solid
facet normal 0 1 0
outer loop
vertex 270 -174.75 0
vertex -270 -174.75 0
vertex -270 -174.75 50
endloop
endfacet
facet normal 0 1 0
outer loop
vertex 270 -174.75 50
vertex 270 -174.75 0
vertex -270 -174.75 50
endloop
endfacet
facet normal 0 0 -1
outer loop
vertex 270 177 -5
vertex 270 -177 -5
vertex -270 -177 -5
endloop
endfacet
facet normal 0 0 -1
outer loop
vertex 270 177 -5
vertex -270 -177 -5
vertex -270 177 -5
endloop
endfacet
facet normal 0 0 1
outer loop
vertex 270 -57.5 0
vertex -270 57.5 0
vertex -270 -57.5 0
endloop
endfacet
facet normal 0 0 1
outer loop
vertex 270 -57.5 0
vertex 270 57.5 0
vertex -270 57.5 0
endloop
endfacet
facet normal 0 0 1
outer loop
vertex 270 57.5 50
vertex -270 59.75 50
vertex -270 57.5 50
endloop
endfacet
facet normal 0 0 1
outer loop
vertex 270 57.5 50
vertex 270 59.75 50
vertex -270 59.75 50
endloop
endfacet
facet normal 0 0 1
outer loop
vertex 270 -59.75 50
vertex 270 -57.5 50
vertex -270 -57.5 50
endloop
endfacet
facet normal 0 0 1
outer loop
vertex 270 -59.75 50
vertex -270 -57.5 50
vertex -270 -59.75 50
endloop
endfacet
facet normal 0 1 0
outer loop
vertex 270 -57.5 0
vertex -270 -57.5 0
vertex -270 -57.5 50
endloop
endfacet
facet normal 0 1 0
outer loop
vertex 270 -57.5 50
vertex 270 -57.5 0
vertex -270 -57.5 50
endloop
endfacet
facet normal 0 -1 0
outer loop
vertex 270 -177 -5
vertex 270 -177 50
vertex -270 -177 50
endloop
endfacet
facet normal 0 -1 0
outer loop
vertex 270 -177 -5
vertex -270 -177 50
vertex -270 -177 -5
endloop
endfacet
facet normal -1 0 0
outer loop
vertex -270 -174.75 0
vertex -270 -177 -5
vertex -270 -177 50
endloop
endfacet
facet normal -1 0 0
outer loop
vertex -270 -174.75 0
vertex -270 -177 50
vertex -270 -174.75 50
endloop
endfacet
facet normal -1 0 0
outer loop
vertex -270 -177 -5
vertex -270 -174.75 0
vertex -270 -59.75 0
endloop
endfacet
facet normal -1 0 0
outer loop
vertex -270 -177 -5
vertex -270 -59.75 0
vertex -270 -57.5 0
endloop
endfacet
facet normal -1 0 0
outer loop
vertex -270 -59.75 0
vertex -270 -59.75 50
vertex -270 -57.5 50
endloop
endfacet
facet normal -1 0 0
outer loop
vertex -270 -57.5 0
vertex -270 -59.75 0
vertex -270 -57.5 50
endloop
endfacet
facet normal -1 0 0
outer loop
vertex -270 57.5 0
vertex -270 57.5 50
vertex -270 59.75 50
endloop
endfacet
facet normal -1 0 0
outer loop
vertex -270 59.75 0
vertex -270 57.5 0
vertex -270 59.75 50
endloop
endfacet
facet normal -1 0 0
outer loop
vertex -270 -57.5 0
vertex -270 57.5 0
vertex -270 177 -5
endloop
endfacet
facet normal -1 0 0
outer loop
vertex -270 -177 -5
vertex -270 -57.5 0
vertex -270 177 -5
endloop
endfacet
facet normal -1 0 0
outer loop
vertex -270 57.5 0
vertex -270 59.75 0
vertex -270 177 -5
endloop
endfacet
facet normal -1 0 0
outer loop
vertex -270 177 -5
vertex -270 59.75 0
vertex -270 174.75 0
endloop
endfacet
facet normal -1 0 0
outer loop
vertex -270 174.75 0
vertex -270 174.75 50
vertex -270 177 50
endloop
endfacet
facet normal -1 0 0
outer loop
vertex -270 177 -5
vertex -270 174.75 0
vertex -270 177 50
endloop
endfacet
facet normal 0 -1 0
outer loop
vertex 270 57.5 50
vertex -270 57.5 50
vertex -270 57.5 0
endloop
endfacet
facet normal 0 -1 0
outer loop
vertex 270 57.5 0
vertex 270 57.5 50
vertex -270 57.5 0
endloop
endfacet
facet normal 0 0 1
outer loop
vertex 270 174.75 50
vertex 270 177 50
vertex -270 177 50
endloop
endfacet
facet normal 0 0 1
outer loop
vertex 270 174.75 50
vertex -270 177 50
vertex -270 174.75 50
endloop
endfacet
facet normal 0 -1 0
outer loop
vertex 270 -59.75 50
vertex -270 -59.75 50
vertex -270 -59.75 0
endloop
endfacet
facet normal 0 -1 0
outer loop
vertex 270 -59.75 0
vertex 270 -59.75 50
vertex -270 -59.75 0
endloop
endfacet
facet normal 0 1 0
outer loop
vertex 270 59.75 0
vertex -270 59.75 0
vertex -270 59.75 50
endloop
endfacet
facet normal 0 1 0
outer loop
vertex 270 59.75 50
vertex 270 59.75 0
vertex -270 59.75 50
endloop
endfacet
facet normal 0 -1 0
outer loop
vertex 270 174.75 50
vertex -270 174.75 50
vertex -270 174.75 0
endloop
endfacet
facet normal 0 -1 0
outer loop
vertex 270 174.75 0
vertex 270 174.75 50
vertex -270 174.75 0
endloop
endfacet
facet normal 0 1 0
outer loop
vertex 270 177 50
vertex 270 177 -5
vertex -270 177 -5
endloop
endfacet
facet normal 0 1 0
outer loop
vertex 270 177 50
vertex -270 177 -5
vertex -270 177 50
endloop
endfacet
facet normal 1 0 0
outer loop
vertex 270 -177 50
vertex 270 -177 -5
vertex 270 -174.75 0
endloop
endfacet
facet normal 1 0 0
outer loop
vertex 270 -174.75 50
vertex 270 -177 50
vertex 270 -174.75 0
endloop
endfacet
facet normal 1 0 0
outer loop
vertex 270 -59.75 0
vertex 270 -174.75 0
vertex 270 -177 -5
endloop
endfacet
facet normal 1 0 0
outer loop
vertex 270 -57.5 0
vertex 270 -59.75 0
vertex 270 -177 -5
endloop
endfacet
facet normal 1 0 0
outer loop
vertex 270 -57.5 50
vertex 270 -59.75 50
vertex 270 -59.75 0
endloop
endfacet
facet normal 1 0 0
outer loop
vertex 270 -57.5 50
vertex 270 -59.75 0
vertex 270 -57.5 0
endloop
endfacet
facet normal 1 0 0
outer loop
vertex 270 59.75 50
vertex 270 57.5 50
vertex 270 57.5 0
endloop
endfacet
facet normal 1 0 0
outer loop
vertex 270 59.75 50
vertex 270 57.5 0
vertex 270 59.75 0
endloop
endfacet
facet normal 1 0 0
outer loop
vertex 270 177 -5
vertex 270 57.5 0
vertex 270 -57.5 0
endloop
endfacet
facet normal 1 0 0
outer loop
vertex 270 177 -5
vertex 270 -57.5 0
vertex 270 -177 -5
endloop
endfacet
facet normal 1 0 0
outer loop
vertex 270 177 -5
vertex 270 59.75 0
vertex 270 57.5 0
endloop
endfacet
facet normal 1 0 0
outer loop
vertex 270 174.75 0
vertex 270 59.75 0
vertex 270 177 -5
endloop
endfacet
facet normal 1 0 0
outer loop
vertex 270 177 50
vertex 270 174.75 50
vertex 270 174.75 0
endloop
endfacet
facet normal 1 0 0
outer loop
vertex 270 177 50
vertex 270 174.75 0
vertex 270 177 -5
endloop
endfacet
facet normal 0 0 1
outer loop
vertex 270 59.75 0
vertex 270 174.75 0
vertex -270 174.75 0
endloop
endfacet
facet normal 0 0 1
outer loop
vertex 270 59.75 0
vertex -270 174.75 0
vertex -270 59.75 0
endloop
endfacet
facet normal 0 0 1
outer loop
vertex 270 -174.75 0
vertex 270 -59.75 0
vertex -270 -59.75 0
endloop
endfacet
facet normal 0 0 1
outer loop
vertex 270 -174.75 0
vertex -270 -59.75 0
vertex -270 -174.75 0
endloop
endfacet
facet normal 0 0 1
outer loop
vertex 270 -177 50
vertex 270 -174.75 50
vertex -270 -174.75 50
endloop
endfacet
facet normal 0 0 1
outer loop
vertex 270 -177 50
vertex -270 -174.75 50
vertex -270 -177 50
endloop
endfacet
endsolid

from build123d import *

# Parameters (mm, degrees)
F1_DEPTH = 270


with BuildPart() as f1:
    # F0 (on Right) → F1 (new body, symmetric)
    with BuildSketch(Plane.YZ):
        Polygon((57.5, 0), (0, 0), (-57.5, 0), (-57.5, 50), (-59.75, 50), (-59.75, 0), (-174.75, 0), (-174.75, 50), (-177, 50), (-177, -5), (0, -5), (177, -5), (177, 50), (174.75, 50), (174.75, 0), (59.75, 0), (59.75, 50), (57.5, 50), align=None)
    extrude(amount=F1_DEPTH, both=True)


solid = f1.part
